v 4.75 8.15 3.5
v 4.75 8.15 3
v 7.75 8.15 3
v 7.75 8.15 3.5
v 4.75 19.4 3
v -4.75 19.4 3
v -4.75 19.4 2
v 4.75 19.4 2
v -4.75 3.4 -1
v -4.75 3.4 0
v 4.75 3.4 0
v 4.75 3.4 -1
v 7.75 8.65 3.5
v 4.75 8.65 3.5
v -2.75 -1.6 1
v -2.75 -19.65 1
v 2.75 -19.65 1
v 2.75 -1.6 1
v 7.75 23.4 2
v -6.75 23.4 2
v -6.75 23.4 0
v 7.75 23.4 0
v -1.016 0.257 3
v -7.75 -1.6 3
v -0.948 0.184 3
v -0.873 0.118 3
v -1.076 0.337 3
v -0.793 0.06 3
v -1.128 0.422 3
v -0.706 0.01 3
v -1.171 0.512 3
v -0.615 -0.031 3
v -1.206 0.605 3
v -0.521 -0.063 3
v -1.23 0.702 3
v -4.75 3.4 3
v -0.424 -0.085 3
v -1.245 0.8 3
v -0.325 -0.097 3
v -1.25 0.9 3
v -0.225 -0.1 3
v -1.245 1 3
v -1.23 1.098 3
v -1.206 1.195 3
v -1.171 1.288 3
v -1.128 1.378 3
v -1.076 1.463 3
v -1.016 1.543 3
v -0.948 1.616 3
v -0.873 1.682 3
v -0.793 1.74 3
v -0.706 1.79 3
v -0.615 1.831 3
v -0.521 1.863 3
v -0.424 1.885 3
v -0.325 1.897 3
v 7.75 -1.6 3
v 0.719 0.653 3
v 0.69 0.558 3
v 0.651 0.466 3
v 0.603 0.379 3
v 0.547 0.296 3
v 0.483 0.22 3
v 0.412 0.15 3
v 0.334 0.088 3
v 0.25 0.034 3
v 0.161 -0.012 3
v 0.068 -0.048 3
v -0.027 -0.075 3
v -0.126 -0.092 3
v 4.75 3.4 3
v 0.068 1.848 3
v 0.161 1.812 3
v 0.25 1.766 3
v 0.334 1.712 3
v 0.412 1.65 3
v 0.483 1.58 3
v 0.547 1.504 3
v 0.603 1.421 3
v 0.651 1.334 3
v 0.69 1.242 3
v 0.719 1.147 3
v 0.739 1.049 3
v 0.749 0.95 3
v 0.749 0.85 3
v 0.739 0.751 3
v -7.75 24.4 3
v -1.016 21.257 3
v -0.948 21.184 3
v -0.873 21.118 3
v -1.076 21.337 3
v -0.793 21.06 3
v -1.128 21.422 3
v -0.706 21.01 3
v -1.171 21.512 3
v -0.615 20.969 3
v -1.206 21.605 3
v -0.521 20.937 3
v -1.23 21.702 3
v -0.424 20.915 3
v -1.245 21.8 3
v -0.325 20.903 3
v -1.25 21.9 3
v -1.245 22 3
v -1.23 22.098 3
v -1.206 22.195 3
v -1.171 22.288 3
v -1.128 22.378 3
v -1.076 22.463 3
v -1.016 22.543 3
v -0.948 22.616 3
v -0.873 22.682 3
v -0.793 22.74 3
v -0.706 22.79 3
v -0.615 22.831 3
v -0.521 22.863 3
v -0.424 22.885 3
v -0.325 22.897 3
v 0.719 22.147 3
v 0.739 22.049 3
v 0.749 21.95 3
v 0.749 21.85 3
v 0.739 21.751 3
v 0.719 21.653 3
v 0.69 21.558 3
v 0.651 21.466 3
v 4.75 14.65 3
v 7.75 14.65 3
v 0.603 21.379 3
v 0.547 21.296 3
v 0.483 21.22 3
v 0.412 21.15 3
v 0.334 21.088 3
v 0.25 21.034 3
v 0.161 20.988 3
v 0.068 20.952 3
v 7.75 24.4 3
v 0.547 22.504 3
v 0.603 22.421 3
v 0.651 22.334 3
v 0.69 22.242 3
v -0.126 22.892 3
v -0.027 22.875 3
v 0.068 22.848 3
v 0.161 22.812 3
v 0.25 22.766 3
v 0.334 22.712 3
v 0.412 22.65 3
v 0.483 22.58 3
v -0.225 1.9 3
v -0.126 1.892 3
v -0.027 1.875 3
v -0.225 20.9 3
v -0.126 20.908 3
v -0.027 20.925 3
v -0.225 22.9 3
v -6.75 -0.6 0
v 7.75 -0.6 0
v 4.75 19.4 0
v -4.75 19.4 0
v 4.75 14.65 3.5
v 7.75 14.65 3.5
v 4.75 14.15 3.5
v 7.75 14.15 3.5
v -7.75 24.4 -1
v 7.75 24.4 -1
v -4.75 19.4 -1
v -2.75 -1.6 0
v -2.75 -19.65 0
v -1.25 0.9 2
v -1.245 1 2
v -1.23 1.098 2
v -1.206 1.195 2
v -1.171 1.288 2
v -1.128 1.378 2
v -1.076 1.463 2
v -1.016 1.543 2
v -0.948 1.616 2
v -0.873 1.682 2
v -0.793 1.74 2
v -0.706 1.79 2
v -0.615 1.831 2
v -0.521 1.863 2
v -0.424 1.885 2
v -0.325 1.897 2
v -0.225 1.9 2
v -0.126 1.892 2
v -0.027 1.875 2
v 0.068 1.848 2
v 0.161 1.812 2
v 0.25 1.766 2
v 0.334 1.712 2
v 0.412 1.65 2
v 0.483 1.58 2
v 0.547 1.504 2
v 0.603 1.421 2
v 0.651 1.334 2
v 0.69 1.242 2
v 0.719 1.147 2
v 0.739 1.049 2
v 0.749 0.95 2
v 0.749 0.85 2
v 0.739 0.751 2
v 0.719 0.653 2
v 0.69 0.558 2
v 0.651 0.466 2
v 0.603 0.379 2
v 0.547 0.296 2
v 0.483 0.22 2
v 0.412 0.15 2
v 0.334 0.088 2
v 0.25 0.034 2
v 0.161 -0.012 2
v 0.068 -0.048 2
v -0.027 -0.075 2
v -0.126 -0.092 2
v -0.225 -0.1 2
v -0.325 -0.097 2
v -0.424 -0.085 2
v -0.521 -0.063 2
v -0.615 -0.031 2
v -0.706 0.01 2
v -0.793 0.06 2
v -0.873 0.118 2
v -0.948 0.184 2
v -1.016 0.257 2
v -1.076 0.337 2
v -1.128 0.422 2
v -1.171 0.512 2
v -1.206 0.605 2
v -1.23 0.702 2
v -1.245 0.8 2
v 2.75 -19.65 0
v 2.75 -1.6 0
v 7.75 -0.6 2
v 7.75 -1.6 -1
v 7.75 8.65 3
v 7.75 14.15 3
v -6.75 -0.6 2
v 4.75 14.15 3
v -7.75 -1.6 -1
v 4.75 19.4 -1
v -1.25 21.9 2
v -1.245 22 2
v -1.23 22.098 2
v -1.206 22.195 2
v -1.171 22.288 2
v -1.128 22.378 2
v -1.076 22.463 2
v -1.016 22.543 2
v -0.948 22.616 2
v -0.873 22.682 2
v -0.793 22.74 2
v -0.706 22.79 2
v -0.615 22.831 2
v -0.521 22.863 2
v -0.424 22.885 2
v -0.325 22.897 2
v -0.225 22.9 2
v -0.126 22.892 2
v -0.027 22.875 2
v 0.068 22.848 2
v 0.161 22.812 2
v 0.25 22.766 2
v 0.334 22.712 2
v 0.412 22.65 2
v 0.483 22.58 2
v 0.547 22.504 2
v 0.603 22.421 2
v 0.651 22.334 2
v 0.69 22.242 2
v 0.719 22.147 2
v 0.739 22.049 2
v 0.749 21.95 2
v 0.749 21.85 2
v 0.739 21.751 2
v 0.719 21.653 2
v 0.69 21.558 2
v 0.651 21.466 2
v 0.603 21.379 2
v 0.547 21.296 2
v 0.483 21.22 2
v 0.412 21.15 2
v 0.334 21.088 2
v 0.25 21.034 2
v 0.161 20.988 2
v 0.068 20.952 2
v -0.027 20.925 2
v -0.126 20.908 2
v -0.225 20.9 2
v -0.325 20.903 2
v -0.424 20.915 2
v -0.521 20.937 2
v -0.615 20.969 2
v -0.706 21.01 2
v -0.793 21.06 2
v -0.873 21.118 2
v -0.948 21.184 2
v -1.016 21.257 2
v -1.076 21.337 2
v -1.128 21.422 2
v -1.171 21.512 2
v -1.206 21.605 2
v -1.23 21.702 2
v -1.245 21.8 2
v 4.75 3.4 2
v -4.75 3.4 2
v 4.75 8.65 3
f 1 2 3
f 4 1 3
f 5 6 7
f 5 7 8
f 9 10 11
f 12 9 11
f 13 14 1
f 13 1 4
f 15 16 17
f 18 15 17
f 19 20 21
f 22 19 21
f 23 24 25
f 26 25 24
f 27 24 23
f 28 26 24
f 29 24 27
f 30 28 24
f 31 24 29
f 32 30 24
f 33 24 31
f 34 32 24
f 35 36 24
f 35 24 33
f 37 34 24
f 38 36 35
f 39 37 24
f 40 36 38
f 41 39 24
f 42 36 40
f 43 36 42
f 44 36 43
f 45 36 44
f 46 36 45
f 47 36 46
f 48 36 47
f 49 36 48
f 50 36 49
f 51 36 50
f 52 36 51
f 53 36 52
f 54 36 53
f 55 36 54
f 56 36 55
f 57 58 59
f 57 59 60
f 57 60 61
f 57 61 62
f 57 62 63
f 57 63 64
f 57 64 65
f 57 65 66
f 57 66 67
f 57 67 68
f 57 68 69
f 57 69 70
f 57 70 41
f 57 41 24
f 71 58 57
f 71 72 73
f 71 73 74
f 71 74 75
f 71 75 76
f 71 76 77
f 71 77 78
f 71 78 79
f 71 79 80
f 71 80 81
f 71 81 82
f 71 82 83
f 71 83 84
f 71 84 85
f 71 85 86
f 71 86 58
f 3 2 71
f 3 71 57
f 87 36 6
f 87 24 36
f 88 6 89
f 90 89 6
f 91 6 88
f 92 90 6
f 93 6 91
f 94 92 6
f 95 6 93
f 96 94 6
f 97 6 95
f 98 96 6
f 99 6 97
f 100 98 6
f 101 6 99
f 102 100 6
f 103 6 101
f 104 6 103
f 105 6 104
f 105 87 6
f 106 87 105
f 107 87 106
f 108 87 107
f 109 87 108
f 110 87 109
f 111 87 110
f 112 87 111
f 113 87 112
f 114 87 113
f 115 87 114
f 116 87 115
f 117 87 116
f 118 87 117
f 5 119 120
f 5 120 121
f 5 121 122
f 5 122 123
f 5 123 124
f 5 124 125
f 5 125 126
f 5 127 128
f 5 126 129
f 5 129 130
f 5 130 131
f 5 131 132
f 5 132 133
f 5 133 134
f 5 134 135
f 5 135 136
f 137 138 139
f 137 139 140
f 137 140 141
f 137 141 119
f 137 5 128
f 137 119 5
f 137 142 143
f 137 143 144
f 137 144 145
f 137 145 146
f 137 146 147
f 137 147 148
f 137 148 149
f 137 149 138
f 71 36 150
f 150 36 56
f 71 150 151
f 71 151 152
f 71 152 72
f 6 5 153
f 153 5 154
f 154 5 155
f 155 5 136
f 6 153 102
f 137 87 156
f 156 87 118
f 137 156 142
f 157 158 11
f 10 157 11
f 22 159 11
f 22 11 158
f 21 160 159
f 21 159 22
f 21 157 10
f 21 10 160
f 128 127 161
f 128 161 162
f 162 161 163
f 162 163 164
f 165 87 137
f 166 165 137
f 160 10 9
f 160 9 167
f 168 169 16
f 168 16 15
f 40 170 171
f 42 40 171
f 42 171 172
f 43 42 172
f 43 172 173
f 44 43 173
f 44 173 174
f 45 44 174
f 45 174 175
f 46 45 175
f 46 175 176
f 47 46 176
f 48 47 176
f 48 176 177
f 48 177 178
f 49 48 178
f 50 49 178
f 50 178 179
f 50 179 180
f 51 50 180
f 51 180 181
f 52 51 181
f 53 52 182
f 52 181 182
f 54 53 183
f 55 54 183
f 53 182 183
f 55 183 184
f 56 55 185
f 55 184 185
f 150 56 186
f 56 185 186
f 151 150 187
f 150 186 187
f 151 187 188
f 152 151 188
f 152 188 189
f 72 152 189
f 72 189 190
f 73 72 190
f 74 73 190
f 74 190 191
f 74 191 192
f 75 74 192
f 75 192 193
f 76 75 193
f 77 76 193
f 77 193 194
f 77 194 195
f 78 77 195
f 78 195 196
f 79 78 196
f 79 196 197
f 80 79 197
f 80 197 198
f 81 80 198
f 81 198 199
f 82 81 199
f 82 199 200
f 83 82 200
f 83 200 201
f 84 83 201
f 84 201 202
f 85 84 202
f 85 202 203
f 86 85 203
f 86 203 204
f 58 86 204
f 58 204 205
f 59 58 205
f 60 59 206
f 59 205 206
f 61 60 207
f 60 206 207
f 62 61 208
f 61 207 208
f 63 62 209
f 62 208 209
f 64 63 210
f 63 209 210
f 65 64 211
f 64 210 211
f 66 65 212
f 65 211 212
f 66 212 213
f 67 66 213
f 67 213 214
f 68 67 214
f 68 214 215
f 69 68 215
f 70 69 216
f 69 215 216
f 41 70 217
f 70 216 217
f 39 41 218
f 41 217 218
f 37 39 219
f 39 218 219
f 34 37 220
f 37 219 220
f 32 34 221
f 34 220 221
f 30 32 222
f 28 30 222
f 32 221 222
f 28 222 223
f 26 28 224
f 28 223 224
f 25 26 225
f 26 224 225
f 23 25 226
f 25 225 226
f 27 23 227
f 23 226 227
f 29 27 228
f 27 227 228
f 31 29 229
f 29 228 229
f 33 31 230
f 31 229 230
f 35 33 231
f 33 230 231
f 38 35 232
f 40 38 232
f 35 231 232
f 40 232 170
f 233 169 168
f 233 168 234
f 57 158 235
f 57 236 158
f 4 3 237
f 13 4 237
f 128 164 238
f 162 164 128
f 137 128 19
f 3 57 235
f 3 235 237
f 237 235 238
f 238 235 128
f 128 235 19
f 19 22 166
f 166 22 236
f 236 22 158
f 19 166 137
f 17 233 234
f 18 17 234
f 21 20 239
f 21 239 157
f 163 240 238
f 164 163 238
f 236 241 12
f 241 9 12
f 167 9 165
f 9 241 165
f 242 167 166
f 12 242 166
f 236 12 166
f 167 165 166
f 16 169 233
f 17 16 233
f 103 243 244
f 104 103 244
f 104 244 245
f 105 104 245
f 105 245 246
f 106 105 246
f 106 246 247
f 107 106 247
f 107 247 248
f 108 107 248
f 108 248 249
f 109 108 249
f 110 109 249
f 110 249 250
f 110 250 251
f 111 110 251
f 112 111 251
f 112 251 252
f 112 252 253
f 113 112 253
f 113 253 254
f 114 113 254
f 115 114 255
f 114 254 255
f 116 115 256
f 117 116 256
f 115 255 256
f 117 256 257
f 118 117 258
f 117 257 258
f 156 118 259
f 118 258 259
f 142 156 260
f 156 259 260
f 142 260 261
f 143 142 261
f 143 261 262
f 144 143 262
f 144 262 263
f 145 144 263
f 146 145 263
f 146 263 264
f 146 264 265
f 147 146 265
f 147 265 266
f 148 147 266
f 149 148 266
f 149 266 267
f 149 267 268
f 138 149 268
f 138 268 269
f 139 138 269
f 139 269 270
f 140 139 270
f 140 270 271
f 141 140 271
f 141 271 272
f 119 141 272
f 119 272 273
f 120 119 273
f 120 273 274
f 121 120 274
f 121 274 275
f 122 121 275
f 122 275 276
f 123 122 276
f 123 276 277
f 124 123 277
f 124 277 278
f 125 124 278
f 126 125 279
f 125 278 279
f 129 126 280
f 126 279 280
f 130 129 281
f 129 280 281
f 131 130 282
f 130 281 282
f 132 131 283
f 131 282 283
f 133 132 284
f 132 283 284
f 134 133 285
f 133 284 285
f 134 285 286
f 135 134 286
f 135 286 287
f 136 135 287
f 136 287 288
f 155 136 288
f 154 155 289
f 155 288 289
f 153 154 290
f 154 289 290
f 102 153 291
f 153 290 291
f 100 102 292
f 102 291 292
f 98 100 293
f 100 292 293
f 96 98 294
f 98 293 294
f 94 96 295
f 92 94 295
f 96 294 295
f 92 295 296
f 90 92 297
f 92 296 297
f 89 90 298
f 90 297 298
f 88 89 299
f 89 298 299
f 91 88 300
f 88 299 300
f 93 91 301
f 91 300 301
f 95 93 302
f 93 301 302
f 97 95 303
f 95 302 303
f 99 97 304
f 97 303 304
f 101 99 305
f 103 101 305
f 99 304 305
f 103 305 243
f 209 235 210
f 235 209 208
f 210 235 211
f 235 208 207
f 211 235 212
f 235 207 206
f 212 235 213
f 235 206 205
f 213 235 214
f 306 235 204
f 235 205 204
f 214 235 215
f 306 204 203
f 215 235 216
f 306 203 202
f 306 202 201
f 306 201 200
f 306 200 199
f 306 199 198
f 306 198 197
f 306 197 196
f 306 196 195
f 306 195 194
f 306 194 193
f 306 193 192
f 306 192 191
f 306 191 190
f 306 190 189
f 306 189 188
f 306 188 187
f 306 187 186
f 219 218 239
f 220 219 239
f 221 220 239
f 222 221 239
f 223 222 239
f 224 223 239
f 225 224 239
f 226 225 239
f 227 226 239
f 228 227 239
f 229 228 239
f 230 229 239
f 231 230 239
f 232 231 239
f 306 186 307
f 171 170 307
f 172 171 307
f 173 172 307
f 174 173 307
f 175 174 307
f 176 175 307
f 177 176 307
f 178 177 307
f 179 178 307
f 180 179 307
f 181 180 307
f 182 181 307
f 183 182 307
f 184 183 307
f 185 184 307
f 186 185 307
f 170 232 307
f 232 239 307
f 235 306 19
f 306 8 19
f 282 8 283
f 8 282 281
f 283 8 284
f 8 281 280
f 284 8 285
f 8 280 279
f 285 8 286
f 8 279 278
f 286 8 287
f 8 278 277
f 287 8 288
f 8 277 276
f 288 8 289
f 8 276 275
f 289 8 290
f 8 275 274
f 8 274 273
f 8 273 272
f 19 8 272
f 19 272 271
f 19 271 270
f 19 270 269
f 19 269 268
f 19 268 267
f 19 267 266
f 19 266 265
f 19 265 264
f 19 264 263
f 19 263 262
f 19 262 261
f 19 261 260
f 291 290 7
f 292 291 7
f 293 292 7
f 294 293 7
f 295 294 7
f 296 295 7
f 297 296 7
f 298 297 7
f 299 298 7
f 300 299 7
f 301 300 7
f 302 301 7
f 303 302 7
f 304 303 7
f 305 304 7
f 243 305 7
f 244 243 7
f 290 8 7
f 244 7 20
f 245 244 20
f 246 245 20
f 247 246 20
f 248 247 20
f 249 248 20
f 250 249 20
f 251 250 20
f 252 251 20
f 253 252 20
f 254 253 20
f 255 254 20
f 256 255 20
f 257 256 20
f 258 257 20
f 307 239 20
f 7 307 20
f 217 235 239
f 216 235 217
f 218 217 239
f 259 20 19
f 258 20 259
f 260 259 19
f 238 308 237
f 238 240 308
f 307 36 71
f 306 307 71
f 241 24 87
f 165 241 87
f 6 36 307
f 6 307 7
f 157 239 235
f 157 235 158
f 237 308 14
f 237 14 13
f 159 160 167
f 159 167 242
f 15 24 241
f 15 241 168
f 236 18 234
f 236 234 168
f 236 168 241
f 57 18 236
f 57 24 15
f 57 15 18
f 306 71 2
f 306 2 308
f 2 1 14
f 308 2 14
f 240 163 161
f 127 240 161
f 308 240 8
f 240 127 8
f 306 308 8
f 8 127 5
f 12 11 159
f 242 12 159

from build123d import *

# Parameters (mm, degrees)
SKETCH1_W                 = 5.5
SKETCH1_H                 = 39.3
BOSS_EXTRUDE1_DEPTH       = 1
SKETCH3_W                 = 15.5
SKETCH3_H                 = 26
BOSS_EXTRUDE5_DEPTH       = 2
SKETCH3_2_W               = 15.5
SKETCH3_2_H               = 26
BOSS_EXTRUDE6_DEPTH       = 2
CUT_EXTRUDE5_DEPTH        = 30.062174729
CUT_EXTRUDE5_DEPTH_BACK   = 14.5
SKETCH10_W                = 2
SKETCH10_H                = 24
SKETCH11_W                = 9.5
SKETCH11_H                = 16
CUT_EXTRUDE7_DEPTH        = 10
F_2_0MM_DOWEL_HOLE1_D     = 2
F_2_0MM_DOWEL_HOLE1_DEPTH = 1
SKETCH15_W                = 3
SKETCH15_H                = 0.5
BOSS_EXTRUDE7_DEPTH       = 0.5


with BuildPart() as part:
    # Sketch1 → Boss-Extrude1 (new body)
    with BuildSketch(Plane.XY):
        Rectangle(SKETCH1_W, SKETCH1_H)
    extrude(amount=BOSS_EXTRUDE1_DEPTH)

    # Sketch3 → Boss-Extrude5 (add, symmetric)
    with BuildSketch(Plane.XY.offset(1)):
        with Locations((0, 11.4)):
            Rectangle(SKETCH3_W, SKETCH3_H)
    extrude(amount=BOSS_EXTRUDE5_DEPTH, both=True)

    # Sketch3<2> → Boss-Extrude6 (add)
    with BuildSketch(Plane.XY.offset(1)):
        with Locations((0, 11.4)):
            Rectangle(SKETCH3_2_W, SKETCH3_2_H)
    extrude(amount=BOSS_EXTRUDE6_DEPTH)

    # Sketch10 → Cut-Extrude5 (cut, two sides: drawn at the far end of the back side and taken through both)
    with BuildSketch(Plane(origin=(7.75, 0, 0), x_dir=(0, 0, -1), z_dir=(1, 0, 0)).offset(-CUT_EXTRUDE5_DEPTH_BACK)):
        with Locations((-1, 11.4)):
            Rectangle(SKETCH10_W, SKETCH10_H)
    extrude(amount=CUT_EXTRUDE5_DEPTH + CUT_EXTRUDE5_DEPTH_BACK, mode=Mode.SUBTRACT)

    # Sketch11 → Cut-Extrude7 (cut)
    with BuildSketch(Plane.XY.offset(3)):
        with Locations((0, 11.4)):
            Rectangle(SKETCH11_W, SKETCH11_H)
    extrude(amount=-CUT_EXTRUDE7_DEPTH, mode=Mode.SUBTRACT)

    # Ø2.0mm Dowel Hole1
    with Locations(Plane(origin=(-0.25, 21.9, 3), x_dir=(1, 0, 0), z_dir=(0, 0, 1))):
        with Locations((0, 0), (0, -21)):
            Hole(F_2_0MM_DOWEL_HOLE1_D / 2, depth=F_2_0MM_DOWEL_HOLE1_DEPTH)

    # Sketch15 → Boss-Extrude7 (add)
    with BuildSketch(Plane.XY.offset(3)):
        with Locations((6.25, 14.4)):
            Rectangle(SKETCH15_W, SKETCH15_H)
        with Locations((6.25, 8.4)):
            Rectangle(SKETCH15_W, SKETCH15_H)
    extrude(amount=BOSS_EXTRUDE7_DEPTH)


solid = part.part
